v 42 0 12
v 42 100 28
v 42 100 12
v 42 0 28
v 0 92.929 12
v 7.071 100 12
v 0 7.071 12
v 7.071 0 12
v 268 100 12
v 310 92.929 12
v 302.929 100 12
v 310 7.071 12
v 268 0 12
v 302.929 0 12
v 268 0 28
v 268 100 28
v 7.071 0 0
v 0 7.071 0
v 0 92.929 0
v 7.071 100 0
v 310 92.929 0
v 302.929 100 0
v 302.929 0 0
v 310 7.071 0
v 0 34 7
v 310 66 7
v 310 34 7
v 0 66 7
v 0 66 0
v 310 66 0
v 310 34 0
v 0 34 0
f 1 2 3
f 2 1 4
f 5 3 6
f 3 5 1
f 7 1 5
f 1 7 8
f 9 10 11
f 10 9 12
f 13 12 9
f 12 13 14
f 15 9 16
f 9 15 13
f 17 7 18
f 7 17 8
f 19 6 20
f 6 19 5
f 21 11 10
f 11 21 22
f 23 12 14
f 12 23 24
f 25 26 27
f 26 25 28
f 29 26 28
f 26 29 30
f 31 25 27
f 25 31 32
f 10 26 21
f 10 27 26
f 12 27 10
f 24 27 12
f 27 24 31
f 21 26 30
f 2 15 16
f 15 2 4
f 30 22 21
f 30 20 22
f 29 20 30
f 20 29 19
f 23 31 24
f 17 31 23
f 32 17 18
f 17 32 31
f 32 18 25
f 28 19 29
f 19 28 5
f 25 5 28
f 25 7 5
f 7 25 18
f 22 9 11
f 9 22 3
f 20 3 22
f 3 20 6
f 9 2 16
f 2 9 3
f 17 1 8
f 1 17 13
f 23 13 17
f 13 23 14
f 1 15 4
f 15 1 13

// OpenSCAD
include <../src/wardrobe.scad>;
plank_zx_front_middle();
//github_openscad -o wardrobe_1/plank_zx_front_middle.stl -D wardrobe_n=1 -D cutting_edge=0 -D break_view_length=0 wardrobe_1/plank_zx_front_middle_stl.scad
